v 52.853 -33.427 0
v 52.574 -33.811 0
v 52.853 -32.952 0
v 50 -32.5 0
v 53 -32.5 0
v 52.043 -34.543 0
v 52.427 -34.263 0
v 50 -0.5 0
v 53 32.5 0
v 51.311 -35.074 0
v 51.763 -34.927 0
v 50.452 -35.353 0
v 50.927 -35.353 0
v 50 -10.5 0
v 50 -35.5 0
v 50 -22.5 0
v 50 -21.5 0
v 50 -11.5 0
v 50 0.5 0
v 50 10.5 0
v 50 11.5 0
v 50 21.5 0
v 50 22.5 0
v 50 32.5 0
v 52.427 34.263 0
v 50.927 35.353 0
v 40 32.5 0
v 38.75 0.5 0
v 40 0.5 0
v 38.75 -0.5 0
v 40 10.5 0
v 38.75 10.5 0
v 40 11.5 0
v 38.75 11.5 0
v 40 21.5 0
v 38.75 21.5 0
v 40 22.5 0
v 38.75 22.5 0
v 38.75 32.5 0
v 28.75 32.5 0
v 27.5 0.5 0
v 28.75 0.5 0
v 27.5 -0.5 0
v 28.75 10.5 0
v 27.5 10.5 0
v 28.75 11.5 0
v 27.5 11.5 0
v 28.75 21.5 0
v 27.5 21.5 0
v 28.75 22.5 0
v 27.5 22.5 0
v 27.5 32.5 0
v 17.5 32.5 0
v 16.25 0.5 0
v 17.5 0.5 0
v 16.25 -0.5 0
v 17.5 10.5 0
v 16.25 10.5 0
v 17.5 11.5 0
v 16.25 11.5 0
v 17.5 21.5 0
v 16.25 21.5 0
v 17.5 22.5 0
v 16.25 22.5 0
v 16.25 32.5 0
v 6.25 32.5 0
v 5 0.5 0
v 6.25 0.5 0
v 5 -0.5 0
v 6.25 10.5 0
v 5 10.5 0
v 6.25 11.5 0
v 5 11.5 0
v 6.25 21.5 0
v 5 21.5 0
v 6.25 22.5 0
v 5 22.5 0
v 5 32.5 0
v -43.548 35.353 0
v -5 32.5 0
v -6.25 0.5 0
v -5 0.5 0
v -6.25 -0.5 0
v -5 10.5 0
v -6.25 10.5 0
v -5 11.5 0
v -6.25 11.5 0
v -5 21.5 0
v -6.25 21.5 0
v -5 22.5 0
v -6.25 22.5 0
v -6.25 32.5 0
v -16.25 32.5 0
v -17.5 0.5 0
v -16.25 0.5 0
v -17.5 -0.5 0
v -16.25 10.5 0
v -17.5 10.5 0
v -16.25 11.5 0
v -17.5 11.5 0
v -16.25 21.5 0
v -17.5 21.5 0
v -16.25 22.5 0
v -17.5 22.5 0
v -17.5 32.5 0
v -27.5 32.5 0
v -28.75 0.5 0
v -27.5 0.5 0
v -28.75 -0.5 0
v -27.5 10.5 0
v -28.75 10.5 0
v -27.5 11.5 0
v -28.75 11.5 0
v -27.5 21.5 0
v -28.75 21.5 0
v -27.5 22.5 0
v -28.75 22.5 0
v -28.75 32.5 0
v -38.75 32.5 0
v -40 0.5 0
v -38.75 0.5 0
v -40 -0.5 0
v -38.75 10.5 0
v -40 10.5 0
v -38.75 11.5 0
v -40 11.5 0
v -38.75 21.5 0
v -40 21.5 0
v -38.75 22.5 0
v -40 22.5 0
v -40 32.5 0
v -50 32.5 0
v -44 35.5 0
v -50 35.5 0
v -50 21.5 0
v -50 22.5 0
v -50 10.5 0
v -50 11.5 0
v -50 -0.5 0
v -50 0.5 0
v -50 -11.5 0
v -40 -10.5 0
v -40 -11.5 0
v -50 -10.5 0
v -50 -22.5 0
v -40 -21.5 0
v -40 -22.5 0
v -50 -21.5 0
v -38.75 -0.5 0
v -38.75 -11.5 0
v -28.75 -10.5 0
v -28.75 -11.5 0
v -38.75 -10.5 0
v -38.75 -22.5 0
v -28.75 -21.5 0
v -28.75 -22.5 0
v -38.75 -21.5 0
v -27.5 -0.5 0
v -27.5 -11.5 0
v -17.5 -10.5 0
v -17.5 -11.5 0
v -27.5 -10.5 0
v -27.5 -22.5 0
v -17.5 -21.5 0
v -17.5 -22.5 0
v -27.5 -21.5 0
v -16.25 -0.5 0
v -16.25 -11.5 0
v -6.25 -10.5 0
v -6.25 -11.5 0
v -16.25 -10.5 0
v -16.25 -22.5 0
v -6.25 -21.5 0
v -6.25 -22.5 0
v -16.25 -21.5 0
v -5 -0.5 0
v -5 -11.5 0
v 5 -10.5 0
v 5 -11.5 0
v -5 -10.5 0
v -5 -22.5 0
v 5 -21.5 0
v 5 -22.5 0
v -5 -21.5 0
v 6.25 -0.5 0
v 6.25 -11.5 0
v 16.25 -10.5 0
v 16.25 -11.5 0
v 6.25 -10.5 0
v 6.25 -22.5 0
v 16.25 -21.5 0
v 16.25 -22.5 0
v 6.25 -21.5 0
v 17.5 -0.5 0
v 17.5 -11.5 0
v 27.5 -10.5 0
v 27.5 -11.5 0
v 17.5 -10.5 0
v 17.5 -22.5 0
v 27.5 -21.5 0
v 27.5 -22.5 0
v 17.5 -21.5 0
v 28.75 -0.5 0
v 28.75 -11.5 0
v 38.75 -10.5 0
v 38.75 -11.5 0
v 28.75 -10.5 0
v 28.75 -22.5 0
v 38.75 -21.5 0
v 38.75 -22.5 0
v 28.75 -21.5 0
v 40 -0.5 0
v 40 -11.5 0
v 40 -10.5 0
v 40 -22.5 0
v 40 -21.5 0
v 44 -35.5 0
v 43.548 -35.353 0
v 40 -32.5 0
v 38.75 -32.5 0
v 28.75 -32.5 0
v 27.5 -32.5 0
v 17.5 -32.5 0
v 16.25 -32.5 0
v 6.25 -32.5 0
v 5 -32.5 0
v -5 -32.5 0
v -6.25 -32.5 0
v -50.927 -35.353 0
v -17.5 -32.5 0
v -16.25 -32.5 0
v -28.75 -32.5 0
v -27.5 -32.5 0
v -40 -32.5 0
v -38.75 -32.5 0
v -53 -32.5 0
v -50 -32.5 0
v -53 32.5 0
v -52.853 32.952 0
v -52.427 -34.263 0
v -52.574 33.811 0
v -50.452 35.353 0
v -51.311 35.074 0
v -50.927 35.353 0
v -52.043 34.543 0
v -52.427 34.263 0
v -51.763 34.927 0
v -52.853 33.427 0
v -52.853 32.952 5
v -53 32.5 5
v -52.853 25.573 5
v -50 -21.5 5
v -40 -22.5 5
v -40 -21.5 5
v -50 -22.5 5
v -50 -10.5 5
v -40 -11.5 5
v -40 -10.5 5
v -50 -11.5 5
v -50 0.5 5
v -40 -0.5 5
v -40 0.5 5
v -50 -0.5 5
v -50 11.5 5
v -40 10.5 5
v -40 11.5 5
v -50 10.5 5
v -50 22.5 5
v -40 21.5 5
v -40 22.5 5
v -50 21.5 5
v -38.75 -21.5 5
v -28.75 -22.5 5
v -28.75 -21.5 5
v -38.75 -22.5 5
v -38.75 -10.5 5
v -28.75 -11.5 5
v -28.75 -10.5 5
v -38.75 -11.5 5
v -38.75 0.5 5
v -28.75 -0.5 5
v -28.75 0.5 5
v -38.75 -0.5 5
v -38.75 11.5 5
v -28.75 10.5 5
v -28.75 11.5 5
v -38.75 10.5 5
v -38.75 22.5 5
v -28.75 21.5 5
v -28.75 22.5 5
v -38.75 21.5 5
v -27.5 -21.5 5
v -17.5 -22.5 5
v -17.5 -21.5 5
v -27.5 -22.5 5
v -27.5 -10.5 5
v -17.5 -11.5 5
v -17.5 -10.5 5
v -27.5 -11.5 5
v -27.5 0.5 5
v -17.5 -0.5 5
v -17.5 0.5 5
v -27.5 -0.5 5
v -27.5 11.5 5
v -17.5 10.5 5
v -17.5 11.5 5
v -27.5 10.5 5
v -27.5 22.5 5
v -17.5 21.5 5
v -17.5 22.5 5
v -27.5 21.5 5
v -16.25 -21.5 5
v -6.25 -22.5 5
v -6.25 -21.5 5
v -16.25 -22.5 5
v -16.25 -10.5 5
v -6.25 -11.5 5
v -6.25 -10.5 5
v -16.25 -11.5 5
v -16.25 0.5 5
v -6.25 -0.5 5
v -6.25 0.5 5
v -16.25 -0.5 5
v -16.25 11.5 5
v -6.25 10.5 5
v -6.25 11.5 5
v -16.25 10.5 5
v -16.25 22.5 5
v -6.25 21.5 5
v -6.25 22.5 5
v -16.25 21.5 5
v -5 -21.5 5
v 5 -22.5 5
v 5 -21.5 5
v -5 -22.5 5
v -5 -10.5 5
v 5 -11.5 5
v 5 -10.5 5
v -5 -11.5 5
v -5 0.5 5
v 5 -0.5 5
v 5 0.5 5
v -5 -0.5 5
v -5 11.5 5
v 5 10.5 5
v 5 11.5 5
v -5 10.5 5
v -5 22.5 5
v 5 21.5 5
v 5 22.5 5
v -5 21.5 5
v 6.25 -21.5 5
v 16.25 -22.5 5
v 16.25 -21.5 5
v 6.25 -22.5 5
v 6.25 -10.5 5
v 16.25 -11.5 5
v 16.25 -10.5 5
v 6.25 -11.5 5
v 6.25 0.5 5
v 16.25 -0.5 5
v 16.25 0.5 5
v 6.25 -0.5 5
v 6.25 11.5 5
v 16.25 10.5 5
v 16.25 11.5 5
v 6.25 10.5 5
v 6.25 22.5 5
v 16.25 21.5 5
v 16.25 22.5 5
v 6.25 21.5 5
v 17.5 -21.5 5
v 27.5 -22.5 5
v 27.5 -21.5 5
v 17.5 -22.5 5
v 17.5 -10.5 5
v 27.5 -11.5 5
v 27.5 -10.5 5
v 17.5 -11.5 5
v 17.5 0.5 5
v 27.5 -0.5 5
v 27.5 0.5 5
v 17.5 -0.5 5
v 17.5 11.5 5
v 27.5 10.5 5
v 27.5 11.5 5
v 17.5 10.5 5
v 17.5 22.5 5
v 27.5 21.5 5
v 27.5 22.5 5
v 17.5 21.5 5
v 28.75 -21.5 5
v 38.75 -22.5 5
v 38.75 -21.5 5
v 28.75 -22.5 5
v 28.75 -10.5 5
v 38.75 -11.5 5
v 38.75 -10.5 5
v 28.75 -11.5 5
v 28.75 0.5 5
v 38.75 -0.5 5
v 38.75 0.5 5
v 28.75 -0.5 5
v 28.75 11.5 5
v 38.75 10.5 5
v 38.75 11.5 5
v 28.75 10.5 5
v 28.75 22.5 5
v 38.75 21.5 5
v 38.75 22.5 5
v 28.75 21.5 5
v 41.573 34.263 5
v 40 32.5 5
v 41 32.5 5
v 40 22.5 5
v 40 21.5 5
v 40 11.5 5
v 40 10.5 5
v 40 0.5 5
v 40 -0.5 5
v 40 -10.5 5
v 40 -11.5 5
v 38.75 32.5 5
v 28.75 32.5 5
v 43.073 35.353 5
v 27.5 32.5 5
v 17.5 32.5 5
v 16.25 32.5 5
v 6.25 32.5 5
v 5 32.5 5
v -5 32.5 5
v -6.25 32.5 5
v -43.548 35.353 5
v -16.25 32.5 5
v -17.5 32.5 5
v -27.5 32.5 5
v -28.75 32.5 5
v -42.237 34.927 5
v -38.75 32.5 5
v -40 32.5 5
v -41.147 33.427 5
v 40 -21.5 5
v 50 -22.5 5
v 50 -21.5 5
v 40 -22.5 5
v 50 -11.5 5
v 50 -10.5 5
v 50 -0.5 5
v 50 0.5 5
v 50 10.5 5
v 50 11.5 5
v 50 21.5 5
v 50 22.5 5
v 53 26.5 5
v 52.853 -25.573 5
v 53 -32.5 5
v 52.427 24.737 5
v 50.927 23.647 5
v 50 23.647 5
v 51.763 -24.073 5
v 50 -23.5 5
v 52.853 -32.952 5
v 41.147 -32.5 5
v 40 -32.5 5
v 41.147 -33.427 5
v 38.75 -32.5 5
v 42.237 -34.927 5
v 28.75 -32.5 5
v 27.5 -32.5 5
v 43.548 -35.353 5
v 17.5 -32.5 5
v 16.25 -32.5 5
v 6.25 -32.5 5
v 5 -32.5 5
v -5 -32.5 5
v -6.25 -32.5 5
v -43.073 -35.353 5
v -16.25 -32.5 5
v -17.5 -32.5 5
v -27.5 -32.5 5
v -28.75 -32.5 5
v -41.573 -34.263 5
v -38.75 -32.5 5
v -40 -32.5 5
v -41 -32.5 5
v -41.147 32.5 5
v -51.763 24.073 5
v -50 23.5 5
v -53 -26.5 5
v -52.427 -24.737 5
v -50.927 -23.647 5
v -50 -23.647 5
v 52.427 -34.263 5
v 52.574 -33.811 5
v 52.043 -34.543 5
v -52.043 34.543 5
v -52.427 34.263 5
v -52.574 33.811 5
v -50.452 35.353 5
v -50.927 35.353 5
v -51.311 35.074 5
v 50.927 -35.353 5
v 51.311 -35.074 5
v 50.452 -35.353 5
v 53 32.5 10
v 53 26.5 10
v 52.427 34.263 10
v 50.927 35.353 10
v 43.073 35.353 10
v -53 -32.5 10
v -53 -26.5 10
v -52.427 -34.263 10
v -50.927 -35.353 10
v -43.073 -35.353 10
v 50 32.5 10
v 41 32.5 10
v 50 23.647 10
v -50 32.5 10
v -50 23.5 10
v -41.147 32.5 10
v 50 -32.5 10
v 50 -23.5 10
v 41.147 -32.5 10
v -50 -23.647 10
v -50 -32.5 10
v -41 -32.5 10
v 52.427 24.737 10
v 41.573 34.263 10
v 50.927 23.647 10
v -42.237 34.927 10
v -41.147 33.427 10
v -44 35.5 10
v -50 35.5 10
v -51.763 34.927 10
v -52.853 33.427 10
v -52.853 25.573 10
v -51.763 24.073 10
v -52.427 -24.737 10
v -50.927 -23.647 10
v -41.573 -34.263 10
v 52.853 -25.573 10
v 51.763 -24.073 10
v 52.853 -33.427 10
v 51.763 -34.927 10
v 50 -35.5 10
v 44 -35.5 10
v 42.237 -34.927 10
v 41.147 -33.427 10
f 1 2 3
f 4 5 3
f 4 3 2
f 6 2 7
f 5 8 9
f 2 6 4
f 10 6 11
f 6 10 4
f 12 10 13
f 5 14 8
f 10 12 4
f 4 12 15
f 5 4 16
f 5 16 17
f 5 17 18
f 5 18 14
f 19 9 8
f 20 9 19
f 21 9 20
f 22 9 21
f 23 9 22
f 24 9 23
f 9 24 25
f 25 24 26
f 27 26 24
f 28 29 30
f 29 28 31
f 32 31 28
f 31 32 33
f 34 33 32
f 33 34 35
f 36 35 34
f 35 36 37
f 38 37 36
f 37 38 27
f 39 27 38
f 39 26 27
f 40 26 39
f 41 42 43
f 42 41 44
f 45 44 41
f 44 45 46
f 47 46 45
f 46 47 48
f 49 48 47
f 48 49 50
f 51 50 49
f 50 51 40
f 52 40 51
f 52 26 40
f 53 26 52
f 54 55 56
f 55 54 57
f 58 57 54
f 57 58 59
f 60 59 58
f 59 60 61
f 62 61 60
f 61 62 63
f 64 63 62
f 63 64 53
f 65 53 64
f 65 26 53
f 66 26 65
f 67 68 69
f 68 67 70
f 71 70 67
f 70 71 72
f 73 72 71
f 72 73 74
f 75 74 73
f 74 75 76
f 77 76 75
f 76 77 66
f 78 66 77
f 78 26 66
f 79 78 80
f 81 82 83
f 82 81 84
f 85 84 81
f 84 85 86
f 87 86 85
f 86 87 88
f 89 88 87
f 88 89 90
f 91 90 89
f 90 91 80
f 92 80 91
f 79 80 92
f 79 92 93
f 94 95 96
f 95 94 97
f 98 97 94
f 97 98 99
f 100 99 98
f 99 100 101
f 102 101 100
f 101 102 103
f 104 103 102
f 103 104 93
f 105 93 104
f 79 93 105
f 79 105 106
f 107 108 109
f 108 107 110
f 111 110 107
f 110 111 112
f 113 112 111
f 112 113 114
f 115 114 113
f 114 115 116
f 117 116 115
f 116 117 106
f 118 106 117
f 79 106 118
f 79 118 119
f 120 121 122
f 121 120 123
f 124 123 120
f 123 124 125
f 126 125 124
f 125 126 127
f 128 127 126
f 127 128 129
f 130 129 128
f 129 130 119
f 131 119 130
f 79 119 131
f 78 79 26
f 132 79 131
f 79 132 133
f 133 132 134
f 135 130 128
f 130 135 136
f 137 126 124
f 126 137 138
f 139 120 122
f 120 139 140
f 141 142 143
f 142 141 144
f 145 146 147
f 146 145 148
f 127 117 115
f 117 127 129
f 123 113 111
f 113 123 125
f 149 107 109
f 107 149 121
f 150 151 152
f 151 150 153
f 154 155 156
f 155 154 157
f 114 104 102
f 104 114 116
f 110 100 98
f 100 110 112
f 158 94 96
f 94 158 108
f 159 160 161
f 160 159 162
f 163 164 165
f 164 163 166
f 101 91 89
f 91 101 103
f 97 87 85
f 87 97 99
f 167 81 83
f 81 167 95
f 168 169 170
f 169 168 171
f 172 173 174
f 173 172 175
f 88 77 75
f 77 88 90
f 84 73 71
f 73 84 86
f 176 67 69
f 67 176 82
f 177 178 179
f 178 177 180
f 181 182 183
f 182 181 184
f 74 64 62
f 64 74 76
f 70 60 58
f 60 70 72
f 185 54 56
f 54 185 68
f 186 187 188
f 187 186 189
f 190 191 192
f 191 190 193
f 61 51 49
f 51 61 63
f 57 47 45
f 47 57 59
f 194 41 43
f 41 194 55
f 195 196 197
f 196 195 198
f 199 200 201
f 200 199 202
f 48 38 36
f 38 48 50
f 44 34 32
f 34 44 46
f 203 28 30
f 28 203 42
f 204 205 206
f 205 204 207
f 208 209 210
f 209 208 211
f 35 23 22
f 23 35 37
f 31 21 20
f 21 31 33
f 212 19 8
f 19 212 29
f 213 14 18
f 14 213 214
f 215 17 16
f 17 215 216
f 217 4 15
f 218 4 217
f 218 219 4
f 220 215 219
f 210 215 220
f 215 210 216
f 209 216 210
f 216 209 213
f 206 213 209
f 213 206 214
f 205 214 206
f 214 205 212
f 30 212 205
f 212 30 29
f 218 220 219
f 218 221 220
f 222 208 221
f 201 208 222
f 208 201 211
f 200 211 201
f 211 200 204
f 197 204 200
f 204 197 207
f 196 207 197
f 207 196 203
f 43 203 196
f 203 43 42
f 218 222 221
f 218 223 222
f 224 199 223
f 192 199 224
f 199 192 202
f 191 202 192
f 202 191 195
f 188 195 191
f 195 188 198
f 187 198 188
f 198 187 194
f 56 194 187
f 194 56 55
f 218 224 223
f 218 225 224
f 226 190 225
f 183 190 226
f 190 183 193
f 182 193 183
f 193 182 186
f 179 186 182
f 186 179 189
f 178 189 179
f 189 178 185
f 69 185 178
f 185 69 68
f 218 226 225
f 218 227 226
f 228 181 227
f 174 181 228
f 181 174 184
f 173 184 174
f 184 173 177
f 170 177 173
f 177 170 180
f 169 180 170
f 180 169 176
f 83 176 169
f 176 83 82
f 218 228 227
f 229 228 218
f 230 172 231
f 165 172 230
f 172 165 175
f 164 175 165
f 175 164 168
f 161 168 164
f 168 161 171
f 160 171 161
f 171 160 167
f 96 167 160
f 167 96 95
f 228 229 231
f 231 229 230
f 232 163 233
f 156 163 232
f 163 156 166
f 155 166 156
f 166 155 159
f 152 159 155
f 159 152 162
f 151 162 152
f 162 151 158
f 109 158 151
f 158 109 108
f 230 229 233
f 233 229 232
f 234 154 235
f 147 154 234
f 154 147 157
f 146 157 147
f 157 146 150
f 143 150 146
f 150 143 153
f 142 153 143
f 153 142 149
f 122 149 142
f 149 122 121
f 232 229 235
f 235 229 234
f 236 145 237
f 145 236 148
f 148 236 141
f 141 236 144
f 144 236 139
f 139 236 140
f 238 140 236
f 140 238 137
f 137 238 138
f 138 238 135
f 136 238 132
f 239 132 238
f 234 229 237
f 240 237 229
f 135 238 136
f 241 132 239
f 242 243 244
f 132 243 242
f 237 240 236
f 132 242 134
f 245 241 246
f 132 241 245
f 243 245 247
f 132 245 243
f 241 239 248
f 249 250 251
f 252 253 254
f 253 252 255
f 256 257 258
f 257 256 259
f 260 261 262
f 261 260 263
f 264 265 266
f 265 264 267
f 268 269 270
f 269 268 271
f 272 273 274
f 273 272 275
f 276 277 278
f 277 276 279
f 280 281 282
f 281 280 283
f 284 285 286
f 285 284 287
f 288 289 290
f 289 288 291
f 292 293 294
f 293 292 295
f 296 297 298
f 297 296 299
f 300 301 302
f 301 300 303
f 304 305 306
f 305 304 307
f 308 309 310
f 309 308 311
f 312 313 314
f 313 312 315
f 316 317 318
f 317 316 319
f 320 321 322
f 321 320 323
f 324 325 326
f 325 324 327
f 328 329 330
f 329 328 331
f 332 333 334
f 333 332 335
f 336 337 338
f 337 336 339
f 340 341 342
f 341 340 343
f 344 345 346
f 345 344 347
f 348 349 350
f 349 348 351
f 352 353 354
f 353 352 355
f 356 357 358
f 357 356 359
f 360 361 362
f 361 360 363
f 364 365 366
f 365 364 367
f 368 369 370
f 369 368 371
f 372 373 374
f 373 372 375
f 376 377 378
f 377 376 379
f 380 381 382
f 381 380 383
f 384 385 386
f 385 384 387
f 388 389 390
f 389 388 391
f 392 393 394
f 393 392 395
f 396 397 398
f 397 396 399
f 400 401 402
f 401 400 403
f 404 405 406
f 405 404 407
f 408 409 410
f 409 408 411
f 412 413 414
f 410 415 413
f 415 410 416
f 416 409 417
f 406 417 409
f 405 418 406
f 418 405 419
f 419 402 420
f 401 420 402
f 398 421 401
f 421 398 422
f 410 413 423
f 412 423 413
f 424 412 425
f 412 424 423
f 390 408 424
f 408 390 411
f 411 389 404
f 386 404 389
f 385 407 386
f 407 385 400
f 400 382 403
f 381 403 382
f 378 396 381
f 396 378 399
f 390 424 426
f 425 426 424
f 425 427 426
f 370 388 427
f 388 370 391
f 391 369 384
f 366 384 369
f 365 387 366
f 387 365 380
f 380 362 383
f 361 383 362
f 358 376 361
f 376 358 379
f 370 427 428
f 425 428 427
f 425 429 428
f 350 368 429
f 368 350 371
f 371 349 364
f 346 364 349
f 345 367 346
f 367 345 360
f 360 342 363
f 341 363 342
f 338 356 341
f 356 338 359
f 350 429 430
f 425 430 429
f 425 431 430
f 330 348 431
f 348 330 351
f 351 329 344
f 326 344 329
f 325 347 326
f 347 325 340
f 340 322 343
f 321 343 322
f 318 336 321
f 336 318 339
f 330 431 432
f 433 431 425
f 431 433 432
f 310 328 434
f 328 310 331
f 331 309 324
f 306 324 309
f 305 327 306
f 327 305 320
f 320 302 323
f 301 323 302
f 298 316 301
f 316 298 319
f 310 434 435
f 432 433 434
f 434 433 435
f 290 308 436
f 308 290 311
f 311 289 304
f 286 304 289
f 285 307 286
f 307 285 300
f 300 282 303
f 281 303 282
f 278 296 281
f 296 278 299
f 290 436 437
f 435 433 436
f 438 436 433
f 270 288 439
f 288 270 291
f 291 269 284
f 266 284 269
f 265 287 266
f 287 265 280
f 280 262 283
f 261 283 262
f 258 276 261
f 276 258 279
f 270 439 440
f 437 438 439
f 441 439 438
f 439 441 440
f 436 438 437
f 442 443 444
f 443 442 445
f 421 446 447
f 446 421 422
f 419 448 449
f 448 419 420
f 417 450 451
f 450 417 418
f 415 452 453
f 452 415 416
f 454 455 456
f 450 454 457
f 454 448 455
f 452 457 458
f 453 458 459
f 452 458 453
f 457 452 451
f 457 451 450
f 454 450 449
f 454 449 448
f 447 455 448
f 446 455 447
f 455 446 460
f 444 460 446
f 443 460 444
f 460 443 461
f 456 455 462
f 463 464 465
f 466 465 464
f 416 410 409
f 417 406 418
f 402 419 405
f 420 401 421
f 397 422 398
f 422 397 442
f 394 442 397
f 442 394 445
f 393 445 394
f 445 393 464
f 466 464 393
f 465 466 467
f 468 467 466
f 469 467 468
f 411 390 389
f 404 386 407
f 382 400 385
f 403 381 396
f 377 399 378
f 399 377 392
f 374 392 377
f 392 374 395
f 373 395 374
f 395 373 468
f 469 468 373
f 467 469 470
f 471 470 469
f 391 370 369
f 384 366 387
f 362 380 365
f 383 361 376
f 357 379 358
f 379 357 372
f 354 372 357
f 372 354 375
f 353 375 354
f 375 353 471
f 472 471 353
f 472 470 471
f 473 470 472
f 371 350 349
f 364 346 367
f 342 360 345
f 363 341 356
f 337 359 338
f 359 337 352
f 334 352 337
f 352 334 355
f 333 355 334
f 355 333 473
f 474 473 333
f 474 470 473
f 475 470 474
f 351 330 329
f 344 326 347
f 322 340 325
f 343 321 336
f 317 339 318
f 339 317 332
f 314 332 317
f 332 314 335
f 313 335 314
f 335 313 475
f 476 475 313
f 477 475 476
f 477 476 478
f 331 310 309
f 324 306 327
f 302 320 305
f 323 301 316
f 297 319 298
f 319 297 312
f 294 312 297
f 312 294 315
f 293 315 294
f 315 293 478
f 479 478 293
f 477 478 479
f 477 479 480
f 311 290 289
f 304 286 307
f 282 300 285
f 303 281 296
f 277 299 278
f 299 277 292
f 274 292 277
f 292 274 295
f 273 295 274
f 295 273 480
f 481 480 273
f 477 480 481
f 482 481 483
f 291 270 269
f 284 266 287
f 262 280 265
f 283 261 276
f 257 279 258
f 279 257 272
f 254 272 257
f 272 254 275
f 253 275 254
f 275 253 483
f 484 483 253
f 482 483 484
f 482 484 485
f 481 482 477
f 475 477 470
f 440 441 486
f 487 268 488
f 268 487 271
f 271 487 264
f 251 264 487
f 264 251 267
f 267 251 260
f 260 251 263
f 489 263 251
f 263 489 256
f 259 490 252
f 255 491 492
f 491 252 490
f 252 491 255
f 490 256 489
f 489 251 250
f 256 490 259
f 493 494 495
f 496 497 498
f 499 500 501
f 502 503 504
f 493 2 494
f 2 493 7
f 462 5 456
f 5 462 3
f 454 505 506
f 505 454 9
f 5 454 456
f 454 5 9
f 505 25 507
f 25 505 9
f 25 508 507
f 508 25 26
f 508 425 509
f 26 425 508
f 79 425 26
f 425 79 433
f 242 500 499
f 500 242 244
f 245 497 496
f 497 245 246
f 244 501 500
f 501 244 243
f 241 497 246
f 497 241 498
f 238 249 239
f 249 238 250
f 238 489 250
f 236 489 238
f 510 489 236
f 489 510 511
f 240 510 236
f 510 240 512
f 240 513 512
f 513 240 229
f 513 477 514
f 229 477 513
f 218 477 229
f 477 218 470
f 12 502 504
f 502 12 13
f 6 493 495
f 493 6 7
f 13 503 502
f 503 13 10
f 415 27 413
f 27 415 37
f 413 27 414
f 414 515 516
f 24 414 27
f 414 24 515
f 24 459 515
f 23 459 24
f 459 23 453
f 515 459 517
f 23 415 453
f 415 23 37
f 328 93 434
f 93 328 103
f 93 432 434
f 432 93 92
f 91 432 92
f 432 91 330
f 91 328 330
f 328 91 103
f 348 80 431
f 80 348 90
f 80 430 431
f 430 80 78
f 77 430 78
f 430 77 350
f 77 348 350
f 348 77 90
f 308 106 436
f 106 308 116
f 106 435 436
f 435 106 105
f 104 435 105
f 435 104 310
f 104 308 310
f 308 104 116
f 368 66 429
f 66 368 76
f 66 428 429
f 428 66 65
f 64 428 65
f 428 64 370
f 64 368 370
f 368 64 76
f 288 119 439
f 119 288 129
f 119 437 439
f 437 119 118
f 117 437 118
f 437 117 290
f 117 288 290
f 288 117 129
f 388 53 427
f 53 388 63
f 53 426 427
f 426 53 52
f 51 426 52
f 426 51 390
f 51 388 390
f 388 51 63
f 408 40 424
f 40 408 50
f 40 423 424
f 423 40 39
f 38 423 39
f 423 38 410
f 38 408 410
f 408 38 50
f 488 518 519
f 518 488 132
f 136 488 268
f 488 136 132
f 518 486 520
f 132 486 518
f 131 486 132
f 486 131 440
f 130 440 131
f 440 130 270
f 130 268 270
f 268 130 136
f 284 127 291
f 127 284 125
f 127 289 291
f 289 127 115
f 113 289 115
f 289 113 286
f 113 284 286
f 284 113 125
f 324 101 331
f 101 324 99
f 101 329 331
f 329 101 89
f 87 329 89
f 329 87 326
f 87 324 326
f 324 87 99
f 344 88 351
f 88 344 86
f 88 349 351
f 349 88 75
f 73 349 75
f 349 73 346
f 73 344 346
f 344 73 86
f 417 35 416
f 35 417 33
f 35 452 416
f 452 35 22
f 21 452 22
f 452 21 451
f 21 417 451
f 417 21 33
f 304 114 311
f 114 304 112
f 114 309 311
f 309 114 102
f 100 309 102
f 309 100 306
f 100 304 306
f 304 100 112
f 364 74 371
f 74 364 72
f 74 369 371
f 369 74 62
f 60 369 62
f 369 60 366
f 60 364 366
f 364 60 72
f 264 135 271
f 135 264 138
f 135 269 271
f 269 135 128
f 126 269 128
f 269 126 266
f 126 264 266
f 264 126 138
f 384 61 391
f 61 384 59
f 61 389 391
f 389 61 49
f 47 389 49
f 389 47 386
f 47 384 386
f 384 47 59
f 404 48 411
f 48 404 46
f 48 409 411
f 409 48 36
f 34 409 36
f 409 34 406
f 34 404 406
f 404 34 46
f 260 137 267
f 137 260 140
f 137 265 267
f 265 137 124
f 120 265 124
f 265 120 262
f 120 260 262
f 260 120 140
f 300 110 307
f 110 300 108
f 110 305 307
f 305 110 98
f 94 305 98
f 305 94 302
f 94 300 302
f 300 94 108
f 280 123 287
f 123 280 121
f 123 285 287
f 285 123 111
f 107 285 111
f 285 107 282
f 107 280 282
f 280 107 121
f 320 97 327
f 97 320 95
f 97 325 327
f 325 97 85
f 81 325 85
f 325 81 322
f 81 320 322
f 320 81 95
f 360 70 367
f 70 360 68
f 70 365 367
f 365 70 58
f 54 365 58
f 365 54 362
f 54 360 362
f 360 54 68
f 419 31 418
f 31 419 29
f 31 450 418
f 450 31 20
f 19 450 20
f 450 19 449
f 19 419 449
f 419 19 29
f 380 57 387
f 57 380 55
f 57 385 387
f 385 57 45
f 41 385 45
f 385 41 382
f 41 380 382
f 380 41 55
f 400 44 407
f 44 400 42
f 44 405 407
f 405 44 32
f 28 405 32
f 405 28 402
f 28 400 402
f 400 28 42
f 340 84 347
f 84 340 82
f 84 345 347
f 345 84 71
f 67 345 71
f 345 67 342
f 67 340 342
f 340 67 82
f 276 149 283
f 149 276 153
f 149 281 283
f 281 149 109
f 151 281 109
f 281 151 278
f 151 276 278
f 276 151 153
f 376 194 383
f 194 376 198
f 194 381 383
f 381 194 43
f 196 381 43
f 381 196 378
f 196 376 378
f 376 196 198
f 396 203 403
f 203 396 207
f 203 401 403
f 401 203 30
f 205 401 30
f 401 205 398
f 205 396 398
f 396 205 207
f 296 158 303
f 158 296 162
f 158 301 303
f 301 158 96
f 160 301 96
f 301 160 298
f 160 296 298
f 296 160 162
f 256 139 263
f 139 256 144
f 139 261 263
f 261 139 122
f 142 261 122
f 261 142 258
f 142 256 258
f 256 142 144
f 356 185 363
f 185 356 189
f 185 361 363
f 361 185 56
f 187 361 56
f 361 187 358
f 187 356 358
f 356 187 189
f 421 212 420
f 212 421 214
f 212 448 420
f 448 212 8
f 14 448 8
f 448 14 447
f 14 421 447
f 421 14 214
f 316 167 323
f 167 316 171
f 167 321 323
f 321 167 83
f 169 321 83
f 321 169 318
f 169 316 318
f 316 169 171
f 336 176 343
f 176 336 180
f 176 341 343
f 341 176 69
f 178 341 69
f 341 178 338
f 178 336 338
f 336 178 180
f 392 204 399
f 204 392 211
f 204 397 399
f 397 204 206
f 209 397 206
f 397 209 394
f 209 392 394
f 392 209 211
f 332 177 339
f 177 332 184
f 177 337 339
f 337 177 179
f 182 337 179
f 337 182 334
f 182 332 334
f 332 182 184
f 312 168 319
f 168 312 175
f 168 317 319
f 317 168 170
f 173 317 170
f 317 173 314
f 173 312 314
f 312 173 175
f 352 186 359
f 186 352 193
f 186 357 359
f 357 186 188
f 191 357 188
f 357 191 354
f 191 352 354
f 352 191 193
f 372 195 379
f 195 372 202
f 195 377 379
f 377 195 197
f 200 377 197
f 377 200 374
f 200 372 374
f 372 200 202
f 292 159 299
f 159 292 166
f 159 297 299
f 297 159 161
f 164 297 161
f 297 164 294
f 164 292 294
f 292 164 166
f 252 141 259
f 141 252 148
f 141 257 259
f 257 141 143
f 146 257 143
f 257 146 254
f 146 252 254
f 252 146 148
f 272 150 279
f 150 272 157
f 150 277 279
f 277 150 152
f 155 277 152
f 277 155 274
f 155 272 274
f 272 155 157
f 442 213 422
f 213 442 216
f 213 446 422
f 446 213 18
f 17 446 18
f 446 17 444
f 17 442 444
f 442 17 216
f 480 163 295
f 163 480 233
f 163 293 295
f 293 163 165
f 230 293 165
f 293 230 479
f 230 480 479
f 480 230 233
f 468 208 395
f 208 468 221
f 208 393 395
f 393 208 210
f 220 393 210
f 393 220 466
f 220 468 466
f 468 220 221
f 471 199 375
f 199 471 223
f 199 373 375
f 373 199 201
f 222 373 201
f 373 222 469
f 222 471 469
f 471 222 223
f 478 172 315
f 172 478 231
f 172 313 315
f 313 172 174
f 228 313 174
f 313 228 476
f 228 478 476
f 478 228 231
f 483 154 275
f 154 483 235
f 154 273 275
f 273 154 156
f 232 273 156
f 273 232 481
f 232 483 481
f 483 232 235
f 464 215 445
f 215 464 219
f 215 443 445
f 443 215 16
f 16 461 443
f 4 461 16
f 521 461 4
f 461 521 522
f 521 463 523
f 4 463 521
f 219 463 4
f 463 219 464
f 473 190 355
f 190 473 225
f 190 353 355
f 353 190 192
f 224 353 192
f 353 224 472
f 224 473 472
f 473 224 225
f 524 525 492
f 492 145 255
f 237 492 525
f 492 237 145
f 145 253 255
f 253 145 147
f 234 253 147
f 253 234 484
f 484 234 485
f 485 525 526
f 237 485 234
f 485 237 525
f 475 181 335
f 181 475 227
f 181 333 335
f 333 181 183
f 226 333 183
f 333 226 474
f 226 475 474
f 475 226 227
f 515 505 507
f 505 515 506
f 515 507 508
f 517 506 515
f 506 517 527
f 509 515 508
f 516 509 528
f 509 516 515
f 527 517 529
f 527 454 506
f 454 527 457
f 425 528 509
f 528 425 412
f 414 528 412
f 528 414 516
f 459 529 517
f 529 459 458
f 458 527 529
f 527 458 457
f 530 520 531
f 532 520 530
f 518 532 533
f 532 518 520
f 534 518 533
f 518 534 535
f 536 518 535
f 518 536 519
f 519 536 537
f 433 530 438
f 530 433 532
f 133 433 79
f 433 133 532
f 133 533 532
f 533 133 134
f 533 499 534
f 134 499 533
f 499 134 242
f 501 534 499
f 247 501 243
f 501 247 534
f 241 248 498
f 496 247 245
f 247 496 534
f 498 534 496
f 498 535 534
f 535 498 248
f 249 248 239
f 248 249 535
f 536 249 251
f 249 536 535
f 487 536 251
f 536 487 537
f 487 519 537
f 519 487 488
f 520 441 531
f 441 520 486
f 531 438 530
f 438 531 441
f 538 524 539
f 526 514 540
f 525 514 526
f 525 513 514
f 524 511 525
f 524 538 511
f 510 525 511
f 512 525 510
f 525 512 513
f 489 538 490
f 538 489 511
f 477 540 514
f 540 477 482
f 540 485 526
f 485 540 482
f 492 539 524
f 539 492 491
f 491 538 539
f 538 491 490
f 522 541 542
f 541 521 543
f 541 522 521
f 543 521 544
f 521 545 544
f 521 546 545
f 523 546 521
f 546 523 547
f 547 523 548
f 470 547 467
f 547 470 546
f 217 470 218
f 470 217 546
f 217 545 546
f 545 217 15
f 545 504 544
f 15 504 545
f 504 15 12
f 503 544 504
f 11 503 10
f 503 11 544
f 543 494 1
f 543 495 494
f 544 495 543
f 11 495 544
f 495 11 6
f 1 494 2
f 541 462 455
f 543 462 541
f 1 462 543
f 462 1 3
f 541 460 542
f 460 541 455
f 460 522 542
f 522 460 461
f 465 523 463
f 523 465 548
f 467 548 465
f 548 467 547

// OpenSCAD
/*
    Soap Dispenser Tray.
    Andrew Lin, December 2021.
*/

/*
    Settings (all dimensions in mm).
    Note: The minkowski transformation will increase the actual
    dimensions of the tray by twice the curve radius.
*/

length = 100;
width = 65;
hole_width = 10;
min_hole_spacing = 1;
face_height = 5;
leg_height = 10;
leg_thickness = 3;
curve_radius = 3;

module leg(r, t, h) {
    linear_extrude(h) {
        difference() {
            minkowski() {
                square(2 * r, center = true);
                circle(r);
            }
            translate([-t, -t, 0]) square(3 * r + t, center = true);
        }
    }
}

module center_leg(l, w, h) {
    linear_extrude(h)
        square([l, w], center = true);
}

module holes(l, w, d, b) {
    dx = (l - d) / floor((l - d) / (d + b));
    dy = (w - d) / floor((w - d) / (d + b));
    translate([-l / 2, -w / 2, 0]) {
        for (x = [0:dx:l - d], y = [0:dy:w - d]) {
            translate([x, y, 0]) square(d);
        }
    }
}
module face(l, w, h, b, r, height) {
    linear_extrude(height) {
        difference() {
            minkowski() {
                square([l, w], center = true);
                circle(r);
            }
            holes(l, w, h, b);
        }
    }
}

dx_leg = length / 2 - curve_radius;
dy_leg = width / 2 - curve_radius;

face(length, width, hole_width, min_hole_spacing, curve_radius, face_height);
translate([dx_leg, dy_leg, 0]) leg(curve_radius, leg_thickness, leg_height);
translate([-dx_leg, dy_leg, 0]) rotate([0, 0, 90]) leg(curve_radius, leg_thickness, leg_height);
translate([-dx_leg, -dy_leg, 0]) rotate([0, 0, 180]) leg(curve_radius, leg_thickness, leg_height);
translate([dx_leg, -dy_leg, 0]) rotate([0, 0, 270]) leg(curve_radius, leg_thickness, leg_height);
